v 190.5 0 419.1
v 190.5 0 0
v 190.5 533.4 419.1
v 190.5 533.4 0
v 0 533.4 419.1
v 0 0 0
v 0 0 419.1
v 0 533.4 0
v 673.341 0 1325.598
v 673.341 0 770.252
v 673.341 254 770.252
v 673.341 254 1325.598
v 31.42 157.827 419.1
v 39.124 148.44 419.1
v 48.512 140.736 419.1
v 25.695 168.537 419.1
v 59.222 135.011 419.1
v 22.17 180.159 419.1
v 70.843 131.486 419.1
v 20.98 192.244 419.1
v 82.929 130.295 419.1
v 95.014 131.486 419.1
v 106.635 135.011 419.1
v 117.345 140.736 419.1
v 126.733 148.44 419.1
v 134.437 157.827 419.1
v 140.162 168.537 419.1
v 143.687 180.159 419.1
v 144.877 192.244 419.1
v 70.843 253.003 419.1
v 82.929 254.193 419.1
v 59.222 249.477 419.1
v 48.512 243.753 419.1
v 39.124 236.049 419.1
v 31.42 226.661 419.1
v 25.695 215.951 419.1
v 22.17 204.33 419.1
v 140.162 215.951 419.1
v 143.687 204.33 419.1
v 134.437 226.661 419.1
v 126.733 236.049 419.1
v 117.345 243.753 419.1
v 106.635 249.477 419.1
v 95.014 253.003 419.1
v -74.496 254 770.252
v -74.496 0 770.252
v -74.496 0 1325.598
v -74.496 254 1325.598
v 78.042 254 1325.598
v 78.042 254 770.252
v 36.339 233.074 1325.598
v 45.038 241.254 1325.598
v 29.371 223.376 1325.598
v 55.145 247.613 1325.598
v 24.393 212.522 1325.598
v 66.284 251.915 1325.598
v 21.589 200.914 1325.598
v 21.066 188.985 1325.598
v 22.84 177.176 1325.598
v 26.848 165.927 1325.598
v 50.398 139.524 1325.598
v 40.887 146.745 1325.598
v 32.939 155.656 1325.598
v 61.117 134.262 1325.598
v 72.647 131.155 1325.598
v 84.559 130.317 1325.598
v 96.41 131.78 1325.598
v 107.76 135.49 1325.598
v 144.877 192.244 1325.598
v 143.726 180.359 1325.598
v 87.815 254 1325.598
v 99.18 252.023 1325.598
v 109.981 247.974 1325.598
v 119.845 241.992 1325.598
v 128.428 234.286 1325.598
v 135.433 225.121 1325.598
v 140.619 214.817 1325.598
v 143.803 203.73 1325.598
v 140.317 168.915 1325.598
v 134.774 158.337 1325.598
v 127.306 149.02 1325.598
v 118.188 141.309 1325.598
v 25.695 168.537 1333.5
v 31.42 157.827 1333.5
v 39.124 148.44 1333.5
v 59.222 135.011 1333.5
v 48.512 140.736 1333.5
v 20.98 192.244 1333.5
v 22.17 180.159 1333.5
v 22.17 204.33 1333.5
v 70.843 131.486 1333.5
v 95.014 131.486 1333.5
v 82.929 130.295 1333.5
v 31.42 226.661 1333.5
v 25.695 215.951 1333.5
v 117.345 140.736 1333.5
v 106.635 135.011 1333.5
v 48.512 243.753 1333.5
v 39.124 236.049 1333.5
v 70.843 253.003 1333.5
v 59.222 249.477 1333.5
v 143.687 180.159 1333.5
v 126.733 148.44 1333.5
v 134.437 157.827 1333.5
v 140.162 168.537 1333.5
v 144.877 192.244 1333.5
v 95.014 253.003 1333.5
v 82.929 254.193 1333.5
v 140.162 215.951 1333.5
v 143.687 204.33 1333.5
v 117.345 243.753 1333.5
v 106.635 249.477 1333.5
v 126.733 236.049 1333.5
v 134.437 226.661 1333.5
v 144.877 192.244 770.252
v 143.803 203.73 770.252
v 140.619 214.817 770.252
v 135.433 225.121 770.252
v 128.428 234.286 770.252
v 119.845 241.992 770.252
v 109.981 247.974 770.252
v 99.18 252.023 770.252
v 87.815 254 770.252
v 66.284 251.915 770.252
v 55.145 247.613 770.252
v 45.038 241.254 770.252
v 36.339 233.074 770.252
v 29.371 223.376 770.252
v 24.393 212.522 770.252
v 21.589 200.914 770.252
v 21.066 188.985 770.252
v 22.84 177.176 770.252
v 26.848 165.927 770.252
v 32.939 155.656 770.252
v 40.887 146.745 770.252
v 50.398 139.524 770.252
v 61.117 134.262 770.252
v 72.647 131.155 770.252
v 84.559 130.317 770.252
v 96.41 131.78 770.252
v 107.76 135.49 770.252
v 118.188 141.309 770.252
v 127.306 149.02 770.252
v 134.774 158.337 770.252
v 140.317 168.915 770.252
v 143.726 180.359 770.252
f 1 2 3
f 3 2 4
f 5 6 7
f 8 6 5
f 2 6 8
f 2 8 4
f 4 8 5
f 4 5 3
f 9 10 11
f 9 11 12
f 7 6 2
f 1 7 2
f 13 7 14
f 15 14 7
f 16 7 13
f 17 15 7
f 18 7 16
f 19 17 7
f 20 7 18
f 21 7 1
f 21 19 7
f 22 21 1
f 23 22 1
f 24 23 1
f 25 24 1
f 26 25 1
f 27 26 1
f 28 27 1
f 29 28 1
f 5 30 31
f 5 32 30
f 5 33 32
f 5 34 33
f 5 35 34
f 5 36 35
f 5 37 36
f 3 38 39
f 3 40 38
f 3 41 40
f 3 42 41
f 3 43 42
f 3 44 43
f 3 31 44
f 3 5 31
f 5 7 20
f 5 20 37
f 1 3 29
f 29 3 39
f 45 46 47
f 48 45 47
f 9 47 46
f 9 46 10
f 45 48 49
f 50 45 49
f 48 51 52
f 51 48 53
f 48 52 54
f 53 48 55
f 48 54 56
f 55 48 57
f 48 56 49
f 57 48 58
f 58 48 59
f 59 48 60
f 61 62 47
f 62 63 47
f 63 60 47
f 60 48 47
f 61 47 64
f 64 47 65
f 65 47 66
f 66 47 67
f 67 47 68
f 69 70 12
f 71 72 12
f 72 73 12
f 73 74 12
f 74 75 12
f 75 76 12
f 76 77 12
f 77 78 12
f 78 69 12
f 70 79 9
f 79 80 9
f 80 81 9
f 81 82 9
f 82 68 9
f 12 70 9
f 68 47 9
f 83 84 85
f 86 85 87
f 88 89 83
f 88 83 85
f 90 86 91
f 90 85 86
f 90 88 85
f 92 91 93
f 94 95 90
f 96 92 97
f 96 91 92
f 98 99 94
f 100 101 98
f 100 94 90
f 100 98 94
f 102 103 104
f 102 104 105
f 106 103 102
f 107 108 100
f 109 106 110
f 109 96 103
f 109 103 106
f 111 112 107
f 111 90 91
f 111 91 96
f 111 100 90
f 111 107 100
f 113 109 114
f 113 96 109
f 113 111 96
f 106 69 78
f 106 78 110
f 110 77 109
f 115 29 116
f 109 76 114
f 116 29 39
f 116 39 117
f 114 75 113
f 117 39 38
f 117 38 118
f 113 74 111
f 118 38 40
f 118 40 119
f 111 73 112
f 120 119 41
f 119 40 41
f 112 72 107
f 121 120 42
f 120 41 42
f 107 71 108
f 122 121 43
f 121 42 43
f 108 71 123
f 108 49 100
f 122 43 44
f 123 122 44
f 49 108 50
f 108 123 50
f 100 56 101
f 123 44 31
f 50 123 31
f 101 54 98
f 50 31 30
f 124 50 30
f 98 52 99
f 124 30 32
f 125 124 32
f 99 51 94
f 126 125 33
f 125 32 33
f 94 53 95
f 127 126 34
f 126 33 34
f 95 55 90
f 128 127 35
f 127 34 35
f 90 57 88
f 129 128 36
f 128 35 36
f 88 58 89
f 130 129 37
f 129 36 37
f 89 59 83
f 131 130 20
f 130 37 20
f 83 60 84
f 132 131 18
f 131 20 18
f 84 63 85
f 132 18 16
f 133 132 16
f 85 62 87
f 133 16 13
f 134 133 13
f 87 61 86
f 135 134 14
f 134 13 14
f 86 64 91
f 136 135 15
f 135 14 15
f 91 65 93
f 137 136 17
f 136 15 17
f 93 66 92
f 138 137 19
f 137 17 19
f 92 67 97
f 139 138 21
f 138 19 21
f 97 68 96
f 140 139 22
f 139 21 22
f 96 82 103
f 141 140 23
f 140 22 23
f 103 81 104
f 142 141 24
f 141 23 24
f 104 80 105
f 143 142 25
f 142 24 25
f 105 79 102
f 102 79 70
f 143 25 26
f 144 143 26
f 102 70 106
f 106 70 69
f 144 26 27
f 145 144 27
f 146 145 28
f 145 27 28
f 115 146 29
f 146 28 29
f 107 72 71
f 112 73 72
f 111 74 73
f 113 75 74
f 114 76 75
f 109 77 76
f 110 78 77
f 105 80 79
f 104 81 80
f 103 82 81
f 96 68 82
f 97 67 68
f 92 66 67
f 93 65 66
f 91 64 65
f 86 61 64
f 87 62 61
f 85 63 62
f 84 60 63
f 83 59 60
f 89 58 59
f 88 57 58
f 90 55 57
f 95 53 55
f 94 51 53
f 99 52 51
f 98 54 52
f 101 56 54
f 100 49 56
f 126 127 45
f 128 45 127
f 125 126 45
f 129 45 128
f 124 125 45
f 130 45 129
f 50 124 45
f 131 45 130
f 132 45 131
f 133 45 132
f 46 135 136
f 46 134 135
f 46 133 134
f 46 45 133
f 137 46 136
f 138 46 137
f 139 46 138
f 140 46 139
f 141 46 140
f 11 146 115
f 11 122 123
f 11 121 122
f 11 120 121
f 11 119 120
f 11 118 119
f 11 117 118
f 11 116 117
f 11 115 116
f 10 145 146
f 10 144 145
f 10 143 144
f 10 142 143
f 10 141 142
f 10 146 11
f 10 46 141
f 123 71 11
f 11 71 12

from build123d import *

# Parameters (mm, degrees)
F0_W     = 190.5
F0_H     = 533.4
F1_DEPTH = 419.1
F2_R     = 61.948807
F3_DEPTH = 914.4
F4_W     = 747.836396
F4_H     = 555.345953
F5_DEPTH = 254


with BuildPart() as f1:
    # F0 (on Top) → F1 (new body)
    with BuildSketch(Plane.XY):
        with Locations((95.25, 266.7)):
            Rectangle(F0_W, F0_H)
    extrude(amount=F1_DEPTH)

    # F2 (on face) → F3 (join)
    with BuildSketch(Plane.XY.offset(419.1)):
        with Locations((82.928531, 192.244217)):
            Circle(F2_R)
    extrude(amount=F3_DEPTH)

    # F4 (on face) → F5 (join)
    with BuildSketch(Plane.XZ):
        with Locations((299.42248, 1047.925144)):
            Rectangle(F4_W, F4_H)
    extrude(amount=-F5_DEPTH)


solid = f1.part
